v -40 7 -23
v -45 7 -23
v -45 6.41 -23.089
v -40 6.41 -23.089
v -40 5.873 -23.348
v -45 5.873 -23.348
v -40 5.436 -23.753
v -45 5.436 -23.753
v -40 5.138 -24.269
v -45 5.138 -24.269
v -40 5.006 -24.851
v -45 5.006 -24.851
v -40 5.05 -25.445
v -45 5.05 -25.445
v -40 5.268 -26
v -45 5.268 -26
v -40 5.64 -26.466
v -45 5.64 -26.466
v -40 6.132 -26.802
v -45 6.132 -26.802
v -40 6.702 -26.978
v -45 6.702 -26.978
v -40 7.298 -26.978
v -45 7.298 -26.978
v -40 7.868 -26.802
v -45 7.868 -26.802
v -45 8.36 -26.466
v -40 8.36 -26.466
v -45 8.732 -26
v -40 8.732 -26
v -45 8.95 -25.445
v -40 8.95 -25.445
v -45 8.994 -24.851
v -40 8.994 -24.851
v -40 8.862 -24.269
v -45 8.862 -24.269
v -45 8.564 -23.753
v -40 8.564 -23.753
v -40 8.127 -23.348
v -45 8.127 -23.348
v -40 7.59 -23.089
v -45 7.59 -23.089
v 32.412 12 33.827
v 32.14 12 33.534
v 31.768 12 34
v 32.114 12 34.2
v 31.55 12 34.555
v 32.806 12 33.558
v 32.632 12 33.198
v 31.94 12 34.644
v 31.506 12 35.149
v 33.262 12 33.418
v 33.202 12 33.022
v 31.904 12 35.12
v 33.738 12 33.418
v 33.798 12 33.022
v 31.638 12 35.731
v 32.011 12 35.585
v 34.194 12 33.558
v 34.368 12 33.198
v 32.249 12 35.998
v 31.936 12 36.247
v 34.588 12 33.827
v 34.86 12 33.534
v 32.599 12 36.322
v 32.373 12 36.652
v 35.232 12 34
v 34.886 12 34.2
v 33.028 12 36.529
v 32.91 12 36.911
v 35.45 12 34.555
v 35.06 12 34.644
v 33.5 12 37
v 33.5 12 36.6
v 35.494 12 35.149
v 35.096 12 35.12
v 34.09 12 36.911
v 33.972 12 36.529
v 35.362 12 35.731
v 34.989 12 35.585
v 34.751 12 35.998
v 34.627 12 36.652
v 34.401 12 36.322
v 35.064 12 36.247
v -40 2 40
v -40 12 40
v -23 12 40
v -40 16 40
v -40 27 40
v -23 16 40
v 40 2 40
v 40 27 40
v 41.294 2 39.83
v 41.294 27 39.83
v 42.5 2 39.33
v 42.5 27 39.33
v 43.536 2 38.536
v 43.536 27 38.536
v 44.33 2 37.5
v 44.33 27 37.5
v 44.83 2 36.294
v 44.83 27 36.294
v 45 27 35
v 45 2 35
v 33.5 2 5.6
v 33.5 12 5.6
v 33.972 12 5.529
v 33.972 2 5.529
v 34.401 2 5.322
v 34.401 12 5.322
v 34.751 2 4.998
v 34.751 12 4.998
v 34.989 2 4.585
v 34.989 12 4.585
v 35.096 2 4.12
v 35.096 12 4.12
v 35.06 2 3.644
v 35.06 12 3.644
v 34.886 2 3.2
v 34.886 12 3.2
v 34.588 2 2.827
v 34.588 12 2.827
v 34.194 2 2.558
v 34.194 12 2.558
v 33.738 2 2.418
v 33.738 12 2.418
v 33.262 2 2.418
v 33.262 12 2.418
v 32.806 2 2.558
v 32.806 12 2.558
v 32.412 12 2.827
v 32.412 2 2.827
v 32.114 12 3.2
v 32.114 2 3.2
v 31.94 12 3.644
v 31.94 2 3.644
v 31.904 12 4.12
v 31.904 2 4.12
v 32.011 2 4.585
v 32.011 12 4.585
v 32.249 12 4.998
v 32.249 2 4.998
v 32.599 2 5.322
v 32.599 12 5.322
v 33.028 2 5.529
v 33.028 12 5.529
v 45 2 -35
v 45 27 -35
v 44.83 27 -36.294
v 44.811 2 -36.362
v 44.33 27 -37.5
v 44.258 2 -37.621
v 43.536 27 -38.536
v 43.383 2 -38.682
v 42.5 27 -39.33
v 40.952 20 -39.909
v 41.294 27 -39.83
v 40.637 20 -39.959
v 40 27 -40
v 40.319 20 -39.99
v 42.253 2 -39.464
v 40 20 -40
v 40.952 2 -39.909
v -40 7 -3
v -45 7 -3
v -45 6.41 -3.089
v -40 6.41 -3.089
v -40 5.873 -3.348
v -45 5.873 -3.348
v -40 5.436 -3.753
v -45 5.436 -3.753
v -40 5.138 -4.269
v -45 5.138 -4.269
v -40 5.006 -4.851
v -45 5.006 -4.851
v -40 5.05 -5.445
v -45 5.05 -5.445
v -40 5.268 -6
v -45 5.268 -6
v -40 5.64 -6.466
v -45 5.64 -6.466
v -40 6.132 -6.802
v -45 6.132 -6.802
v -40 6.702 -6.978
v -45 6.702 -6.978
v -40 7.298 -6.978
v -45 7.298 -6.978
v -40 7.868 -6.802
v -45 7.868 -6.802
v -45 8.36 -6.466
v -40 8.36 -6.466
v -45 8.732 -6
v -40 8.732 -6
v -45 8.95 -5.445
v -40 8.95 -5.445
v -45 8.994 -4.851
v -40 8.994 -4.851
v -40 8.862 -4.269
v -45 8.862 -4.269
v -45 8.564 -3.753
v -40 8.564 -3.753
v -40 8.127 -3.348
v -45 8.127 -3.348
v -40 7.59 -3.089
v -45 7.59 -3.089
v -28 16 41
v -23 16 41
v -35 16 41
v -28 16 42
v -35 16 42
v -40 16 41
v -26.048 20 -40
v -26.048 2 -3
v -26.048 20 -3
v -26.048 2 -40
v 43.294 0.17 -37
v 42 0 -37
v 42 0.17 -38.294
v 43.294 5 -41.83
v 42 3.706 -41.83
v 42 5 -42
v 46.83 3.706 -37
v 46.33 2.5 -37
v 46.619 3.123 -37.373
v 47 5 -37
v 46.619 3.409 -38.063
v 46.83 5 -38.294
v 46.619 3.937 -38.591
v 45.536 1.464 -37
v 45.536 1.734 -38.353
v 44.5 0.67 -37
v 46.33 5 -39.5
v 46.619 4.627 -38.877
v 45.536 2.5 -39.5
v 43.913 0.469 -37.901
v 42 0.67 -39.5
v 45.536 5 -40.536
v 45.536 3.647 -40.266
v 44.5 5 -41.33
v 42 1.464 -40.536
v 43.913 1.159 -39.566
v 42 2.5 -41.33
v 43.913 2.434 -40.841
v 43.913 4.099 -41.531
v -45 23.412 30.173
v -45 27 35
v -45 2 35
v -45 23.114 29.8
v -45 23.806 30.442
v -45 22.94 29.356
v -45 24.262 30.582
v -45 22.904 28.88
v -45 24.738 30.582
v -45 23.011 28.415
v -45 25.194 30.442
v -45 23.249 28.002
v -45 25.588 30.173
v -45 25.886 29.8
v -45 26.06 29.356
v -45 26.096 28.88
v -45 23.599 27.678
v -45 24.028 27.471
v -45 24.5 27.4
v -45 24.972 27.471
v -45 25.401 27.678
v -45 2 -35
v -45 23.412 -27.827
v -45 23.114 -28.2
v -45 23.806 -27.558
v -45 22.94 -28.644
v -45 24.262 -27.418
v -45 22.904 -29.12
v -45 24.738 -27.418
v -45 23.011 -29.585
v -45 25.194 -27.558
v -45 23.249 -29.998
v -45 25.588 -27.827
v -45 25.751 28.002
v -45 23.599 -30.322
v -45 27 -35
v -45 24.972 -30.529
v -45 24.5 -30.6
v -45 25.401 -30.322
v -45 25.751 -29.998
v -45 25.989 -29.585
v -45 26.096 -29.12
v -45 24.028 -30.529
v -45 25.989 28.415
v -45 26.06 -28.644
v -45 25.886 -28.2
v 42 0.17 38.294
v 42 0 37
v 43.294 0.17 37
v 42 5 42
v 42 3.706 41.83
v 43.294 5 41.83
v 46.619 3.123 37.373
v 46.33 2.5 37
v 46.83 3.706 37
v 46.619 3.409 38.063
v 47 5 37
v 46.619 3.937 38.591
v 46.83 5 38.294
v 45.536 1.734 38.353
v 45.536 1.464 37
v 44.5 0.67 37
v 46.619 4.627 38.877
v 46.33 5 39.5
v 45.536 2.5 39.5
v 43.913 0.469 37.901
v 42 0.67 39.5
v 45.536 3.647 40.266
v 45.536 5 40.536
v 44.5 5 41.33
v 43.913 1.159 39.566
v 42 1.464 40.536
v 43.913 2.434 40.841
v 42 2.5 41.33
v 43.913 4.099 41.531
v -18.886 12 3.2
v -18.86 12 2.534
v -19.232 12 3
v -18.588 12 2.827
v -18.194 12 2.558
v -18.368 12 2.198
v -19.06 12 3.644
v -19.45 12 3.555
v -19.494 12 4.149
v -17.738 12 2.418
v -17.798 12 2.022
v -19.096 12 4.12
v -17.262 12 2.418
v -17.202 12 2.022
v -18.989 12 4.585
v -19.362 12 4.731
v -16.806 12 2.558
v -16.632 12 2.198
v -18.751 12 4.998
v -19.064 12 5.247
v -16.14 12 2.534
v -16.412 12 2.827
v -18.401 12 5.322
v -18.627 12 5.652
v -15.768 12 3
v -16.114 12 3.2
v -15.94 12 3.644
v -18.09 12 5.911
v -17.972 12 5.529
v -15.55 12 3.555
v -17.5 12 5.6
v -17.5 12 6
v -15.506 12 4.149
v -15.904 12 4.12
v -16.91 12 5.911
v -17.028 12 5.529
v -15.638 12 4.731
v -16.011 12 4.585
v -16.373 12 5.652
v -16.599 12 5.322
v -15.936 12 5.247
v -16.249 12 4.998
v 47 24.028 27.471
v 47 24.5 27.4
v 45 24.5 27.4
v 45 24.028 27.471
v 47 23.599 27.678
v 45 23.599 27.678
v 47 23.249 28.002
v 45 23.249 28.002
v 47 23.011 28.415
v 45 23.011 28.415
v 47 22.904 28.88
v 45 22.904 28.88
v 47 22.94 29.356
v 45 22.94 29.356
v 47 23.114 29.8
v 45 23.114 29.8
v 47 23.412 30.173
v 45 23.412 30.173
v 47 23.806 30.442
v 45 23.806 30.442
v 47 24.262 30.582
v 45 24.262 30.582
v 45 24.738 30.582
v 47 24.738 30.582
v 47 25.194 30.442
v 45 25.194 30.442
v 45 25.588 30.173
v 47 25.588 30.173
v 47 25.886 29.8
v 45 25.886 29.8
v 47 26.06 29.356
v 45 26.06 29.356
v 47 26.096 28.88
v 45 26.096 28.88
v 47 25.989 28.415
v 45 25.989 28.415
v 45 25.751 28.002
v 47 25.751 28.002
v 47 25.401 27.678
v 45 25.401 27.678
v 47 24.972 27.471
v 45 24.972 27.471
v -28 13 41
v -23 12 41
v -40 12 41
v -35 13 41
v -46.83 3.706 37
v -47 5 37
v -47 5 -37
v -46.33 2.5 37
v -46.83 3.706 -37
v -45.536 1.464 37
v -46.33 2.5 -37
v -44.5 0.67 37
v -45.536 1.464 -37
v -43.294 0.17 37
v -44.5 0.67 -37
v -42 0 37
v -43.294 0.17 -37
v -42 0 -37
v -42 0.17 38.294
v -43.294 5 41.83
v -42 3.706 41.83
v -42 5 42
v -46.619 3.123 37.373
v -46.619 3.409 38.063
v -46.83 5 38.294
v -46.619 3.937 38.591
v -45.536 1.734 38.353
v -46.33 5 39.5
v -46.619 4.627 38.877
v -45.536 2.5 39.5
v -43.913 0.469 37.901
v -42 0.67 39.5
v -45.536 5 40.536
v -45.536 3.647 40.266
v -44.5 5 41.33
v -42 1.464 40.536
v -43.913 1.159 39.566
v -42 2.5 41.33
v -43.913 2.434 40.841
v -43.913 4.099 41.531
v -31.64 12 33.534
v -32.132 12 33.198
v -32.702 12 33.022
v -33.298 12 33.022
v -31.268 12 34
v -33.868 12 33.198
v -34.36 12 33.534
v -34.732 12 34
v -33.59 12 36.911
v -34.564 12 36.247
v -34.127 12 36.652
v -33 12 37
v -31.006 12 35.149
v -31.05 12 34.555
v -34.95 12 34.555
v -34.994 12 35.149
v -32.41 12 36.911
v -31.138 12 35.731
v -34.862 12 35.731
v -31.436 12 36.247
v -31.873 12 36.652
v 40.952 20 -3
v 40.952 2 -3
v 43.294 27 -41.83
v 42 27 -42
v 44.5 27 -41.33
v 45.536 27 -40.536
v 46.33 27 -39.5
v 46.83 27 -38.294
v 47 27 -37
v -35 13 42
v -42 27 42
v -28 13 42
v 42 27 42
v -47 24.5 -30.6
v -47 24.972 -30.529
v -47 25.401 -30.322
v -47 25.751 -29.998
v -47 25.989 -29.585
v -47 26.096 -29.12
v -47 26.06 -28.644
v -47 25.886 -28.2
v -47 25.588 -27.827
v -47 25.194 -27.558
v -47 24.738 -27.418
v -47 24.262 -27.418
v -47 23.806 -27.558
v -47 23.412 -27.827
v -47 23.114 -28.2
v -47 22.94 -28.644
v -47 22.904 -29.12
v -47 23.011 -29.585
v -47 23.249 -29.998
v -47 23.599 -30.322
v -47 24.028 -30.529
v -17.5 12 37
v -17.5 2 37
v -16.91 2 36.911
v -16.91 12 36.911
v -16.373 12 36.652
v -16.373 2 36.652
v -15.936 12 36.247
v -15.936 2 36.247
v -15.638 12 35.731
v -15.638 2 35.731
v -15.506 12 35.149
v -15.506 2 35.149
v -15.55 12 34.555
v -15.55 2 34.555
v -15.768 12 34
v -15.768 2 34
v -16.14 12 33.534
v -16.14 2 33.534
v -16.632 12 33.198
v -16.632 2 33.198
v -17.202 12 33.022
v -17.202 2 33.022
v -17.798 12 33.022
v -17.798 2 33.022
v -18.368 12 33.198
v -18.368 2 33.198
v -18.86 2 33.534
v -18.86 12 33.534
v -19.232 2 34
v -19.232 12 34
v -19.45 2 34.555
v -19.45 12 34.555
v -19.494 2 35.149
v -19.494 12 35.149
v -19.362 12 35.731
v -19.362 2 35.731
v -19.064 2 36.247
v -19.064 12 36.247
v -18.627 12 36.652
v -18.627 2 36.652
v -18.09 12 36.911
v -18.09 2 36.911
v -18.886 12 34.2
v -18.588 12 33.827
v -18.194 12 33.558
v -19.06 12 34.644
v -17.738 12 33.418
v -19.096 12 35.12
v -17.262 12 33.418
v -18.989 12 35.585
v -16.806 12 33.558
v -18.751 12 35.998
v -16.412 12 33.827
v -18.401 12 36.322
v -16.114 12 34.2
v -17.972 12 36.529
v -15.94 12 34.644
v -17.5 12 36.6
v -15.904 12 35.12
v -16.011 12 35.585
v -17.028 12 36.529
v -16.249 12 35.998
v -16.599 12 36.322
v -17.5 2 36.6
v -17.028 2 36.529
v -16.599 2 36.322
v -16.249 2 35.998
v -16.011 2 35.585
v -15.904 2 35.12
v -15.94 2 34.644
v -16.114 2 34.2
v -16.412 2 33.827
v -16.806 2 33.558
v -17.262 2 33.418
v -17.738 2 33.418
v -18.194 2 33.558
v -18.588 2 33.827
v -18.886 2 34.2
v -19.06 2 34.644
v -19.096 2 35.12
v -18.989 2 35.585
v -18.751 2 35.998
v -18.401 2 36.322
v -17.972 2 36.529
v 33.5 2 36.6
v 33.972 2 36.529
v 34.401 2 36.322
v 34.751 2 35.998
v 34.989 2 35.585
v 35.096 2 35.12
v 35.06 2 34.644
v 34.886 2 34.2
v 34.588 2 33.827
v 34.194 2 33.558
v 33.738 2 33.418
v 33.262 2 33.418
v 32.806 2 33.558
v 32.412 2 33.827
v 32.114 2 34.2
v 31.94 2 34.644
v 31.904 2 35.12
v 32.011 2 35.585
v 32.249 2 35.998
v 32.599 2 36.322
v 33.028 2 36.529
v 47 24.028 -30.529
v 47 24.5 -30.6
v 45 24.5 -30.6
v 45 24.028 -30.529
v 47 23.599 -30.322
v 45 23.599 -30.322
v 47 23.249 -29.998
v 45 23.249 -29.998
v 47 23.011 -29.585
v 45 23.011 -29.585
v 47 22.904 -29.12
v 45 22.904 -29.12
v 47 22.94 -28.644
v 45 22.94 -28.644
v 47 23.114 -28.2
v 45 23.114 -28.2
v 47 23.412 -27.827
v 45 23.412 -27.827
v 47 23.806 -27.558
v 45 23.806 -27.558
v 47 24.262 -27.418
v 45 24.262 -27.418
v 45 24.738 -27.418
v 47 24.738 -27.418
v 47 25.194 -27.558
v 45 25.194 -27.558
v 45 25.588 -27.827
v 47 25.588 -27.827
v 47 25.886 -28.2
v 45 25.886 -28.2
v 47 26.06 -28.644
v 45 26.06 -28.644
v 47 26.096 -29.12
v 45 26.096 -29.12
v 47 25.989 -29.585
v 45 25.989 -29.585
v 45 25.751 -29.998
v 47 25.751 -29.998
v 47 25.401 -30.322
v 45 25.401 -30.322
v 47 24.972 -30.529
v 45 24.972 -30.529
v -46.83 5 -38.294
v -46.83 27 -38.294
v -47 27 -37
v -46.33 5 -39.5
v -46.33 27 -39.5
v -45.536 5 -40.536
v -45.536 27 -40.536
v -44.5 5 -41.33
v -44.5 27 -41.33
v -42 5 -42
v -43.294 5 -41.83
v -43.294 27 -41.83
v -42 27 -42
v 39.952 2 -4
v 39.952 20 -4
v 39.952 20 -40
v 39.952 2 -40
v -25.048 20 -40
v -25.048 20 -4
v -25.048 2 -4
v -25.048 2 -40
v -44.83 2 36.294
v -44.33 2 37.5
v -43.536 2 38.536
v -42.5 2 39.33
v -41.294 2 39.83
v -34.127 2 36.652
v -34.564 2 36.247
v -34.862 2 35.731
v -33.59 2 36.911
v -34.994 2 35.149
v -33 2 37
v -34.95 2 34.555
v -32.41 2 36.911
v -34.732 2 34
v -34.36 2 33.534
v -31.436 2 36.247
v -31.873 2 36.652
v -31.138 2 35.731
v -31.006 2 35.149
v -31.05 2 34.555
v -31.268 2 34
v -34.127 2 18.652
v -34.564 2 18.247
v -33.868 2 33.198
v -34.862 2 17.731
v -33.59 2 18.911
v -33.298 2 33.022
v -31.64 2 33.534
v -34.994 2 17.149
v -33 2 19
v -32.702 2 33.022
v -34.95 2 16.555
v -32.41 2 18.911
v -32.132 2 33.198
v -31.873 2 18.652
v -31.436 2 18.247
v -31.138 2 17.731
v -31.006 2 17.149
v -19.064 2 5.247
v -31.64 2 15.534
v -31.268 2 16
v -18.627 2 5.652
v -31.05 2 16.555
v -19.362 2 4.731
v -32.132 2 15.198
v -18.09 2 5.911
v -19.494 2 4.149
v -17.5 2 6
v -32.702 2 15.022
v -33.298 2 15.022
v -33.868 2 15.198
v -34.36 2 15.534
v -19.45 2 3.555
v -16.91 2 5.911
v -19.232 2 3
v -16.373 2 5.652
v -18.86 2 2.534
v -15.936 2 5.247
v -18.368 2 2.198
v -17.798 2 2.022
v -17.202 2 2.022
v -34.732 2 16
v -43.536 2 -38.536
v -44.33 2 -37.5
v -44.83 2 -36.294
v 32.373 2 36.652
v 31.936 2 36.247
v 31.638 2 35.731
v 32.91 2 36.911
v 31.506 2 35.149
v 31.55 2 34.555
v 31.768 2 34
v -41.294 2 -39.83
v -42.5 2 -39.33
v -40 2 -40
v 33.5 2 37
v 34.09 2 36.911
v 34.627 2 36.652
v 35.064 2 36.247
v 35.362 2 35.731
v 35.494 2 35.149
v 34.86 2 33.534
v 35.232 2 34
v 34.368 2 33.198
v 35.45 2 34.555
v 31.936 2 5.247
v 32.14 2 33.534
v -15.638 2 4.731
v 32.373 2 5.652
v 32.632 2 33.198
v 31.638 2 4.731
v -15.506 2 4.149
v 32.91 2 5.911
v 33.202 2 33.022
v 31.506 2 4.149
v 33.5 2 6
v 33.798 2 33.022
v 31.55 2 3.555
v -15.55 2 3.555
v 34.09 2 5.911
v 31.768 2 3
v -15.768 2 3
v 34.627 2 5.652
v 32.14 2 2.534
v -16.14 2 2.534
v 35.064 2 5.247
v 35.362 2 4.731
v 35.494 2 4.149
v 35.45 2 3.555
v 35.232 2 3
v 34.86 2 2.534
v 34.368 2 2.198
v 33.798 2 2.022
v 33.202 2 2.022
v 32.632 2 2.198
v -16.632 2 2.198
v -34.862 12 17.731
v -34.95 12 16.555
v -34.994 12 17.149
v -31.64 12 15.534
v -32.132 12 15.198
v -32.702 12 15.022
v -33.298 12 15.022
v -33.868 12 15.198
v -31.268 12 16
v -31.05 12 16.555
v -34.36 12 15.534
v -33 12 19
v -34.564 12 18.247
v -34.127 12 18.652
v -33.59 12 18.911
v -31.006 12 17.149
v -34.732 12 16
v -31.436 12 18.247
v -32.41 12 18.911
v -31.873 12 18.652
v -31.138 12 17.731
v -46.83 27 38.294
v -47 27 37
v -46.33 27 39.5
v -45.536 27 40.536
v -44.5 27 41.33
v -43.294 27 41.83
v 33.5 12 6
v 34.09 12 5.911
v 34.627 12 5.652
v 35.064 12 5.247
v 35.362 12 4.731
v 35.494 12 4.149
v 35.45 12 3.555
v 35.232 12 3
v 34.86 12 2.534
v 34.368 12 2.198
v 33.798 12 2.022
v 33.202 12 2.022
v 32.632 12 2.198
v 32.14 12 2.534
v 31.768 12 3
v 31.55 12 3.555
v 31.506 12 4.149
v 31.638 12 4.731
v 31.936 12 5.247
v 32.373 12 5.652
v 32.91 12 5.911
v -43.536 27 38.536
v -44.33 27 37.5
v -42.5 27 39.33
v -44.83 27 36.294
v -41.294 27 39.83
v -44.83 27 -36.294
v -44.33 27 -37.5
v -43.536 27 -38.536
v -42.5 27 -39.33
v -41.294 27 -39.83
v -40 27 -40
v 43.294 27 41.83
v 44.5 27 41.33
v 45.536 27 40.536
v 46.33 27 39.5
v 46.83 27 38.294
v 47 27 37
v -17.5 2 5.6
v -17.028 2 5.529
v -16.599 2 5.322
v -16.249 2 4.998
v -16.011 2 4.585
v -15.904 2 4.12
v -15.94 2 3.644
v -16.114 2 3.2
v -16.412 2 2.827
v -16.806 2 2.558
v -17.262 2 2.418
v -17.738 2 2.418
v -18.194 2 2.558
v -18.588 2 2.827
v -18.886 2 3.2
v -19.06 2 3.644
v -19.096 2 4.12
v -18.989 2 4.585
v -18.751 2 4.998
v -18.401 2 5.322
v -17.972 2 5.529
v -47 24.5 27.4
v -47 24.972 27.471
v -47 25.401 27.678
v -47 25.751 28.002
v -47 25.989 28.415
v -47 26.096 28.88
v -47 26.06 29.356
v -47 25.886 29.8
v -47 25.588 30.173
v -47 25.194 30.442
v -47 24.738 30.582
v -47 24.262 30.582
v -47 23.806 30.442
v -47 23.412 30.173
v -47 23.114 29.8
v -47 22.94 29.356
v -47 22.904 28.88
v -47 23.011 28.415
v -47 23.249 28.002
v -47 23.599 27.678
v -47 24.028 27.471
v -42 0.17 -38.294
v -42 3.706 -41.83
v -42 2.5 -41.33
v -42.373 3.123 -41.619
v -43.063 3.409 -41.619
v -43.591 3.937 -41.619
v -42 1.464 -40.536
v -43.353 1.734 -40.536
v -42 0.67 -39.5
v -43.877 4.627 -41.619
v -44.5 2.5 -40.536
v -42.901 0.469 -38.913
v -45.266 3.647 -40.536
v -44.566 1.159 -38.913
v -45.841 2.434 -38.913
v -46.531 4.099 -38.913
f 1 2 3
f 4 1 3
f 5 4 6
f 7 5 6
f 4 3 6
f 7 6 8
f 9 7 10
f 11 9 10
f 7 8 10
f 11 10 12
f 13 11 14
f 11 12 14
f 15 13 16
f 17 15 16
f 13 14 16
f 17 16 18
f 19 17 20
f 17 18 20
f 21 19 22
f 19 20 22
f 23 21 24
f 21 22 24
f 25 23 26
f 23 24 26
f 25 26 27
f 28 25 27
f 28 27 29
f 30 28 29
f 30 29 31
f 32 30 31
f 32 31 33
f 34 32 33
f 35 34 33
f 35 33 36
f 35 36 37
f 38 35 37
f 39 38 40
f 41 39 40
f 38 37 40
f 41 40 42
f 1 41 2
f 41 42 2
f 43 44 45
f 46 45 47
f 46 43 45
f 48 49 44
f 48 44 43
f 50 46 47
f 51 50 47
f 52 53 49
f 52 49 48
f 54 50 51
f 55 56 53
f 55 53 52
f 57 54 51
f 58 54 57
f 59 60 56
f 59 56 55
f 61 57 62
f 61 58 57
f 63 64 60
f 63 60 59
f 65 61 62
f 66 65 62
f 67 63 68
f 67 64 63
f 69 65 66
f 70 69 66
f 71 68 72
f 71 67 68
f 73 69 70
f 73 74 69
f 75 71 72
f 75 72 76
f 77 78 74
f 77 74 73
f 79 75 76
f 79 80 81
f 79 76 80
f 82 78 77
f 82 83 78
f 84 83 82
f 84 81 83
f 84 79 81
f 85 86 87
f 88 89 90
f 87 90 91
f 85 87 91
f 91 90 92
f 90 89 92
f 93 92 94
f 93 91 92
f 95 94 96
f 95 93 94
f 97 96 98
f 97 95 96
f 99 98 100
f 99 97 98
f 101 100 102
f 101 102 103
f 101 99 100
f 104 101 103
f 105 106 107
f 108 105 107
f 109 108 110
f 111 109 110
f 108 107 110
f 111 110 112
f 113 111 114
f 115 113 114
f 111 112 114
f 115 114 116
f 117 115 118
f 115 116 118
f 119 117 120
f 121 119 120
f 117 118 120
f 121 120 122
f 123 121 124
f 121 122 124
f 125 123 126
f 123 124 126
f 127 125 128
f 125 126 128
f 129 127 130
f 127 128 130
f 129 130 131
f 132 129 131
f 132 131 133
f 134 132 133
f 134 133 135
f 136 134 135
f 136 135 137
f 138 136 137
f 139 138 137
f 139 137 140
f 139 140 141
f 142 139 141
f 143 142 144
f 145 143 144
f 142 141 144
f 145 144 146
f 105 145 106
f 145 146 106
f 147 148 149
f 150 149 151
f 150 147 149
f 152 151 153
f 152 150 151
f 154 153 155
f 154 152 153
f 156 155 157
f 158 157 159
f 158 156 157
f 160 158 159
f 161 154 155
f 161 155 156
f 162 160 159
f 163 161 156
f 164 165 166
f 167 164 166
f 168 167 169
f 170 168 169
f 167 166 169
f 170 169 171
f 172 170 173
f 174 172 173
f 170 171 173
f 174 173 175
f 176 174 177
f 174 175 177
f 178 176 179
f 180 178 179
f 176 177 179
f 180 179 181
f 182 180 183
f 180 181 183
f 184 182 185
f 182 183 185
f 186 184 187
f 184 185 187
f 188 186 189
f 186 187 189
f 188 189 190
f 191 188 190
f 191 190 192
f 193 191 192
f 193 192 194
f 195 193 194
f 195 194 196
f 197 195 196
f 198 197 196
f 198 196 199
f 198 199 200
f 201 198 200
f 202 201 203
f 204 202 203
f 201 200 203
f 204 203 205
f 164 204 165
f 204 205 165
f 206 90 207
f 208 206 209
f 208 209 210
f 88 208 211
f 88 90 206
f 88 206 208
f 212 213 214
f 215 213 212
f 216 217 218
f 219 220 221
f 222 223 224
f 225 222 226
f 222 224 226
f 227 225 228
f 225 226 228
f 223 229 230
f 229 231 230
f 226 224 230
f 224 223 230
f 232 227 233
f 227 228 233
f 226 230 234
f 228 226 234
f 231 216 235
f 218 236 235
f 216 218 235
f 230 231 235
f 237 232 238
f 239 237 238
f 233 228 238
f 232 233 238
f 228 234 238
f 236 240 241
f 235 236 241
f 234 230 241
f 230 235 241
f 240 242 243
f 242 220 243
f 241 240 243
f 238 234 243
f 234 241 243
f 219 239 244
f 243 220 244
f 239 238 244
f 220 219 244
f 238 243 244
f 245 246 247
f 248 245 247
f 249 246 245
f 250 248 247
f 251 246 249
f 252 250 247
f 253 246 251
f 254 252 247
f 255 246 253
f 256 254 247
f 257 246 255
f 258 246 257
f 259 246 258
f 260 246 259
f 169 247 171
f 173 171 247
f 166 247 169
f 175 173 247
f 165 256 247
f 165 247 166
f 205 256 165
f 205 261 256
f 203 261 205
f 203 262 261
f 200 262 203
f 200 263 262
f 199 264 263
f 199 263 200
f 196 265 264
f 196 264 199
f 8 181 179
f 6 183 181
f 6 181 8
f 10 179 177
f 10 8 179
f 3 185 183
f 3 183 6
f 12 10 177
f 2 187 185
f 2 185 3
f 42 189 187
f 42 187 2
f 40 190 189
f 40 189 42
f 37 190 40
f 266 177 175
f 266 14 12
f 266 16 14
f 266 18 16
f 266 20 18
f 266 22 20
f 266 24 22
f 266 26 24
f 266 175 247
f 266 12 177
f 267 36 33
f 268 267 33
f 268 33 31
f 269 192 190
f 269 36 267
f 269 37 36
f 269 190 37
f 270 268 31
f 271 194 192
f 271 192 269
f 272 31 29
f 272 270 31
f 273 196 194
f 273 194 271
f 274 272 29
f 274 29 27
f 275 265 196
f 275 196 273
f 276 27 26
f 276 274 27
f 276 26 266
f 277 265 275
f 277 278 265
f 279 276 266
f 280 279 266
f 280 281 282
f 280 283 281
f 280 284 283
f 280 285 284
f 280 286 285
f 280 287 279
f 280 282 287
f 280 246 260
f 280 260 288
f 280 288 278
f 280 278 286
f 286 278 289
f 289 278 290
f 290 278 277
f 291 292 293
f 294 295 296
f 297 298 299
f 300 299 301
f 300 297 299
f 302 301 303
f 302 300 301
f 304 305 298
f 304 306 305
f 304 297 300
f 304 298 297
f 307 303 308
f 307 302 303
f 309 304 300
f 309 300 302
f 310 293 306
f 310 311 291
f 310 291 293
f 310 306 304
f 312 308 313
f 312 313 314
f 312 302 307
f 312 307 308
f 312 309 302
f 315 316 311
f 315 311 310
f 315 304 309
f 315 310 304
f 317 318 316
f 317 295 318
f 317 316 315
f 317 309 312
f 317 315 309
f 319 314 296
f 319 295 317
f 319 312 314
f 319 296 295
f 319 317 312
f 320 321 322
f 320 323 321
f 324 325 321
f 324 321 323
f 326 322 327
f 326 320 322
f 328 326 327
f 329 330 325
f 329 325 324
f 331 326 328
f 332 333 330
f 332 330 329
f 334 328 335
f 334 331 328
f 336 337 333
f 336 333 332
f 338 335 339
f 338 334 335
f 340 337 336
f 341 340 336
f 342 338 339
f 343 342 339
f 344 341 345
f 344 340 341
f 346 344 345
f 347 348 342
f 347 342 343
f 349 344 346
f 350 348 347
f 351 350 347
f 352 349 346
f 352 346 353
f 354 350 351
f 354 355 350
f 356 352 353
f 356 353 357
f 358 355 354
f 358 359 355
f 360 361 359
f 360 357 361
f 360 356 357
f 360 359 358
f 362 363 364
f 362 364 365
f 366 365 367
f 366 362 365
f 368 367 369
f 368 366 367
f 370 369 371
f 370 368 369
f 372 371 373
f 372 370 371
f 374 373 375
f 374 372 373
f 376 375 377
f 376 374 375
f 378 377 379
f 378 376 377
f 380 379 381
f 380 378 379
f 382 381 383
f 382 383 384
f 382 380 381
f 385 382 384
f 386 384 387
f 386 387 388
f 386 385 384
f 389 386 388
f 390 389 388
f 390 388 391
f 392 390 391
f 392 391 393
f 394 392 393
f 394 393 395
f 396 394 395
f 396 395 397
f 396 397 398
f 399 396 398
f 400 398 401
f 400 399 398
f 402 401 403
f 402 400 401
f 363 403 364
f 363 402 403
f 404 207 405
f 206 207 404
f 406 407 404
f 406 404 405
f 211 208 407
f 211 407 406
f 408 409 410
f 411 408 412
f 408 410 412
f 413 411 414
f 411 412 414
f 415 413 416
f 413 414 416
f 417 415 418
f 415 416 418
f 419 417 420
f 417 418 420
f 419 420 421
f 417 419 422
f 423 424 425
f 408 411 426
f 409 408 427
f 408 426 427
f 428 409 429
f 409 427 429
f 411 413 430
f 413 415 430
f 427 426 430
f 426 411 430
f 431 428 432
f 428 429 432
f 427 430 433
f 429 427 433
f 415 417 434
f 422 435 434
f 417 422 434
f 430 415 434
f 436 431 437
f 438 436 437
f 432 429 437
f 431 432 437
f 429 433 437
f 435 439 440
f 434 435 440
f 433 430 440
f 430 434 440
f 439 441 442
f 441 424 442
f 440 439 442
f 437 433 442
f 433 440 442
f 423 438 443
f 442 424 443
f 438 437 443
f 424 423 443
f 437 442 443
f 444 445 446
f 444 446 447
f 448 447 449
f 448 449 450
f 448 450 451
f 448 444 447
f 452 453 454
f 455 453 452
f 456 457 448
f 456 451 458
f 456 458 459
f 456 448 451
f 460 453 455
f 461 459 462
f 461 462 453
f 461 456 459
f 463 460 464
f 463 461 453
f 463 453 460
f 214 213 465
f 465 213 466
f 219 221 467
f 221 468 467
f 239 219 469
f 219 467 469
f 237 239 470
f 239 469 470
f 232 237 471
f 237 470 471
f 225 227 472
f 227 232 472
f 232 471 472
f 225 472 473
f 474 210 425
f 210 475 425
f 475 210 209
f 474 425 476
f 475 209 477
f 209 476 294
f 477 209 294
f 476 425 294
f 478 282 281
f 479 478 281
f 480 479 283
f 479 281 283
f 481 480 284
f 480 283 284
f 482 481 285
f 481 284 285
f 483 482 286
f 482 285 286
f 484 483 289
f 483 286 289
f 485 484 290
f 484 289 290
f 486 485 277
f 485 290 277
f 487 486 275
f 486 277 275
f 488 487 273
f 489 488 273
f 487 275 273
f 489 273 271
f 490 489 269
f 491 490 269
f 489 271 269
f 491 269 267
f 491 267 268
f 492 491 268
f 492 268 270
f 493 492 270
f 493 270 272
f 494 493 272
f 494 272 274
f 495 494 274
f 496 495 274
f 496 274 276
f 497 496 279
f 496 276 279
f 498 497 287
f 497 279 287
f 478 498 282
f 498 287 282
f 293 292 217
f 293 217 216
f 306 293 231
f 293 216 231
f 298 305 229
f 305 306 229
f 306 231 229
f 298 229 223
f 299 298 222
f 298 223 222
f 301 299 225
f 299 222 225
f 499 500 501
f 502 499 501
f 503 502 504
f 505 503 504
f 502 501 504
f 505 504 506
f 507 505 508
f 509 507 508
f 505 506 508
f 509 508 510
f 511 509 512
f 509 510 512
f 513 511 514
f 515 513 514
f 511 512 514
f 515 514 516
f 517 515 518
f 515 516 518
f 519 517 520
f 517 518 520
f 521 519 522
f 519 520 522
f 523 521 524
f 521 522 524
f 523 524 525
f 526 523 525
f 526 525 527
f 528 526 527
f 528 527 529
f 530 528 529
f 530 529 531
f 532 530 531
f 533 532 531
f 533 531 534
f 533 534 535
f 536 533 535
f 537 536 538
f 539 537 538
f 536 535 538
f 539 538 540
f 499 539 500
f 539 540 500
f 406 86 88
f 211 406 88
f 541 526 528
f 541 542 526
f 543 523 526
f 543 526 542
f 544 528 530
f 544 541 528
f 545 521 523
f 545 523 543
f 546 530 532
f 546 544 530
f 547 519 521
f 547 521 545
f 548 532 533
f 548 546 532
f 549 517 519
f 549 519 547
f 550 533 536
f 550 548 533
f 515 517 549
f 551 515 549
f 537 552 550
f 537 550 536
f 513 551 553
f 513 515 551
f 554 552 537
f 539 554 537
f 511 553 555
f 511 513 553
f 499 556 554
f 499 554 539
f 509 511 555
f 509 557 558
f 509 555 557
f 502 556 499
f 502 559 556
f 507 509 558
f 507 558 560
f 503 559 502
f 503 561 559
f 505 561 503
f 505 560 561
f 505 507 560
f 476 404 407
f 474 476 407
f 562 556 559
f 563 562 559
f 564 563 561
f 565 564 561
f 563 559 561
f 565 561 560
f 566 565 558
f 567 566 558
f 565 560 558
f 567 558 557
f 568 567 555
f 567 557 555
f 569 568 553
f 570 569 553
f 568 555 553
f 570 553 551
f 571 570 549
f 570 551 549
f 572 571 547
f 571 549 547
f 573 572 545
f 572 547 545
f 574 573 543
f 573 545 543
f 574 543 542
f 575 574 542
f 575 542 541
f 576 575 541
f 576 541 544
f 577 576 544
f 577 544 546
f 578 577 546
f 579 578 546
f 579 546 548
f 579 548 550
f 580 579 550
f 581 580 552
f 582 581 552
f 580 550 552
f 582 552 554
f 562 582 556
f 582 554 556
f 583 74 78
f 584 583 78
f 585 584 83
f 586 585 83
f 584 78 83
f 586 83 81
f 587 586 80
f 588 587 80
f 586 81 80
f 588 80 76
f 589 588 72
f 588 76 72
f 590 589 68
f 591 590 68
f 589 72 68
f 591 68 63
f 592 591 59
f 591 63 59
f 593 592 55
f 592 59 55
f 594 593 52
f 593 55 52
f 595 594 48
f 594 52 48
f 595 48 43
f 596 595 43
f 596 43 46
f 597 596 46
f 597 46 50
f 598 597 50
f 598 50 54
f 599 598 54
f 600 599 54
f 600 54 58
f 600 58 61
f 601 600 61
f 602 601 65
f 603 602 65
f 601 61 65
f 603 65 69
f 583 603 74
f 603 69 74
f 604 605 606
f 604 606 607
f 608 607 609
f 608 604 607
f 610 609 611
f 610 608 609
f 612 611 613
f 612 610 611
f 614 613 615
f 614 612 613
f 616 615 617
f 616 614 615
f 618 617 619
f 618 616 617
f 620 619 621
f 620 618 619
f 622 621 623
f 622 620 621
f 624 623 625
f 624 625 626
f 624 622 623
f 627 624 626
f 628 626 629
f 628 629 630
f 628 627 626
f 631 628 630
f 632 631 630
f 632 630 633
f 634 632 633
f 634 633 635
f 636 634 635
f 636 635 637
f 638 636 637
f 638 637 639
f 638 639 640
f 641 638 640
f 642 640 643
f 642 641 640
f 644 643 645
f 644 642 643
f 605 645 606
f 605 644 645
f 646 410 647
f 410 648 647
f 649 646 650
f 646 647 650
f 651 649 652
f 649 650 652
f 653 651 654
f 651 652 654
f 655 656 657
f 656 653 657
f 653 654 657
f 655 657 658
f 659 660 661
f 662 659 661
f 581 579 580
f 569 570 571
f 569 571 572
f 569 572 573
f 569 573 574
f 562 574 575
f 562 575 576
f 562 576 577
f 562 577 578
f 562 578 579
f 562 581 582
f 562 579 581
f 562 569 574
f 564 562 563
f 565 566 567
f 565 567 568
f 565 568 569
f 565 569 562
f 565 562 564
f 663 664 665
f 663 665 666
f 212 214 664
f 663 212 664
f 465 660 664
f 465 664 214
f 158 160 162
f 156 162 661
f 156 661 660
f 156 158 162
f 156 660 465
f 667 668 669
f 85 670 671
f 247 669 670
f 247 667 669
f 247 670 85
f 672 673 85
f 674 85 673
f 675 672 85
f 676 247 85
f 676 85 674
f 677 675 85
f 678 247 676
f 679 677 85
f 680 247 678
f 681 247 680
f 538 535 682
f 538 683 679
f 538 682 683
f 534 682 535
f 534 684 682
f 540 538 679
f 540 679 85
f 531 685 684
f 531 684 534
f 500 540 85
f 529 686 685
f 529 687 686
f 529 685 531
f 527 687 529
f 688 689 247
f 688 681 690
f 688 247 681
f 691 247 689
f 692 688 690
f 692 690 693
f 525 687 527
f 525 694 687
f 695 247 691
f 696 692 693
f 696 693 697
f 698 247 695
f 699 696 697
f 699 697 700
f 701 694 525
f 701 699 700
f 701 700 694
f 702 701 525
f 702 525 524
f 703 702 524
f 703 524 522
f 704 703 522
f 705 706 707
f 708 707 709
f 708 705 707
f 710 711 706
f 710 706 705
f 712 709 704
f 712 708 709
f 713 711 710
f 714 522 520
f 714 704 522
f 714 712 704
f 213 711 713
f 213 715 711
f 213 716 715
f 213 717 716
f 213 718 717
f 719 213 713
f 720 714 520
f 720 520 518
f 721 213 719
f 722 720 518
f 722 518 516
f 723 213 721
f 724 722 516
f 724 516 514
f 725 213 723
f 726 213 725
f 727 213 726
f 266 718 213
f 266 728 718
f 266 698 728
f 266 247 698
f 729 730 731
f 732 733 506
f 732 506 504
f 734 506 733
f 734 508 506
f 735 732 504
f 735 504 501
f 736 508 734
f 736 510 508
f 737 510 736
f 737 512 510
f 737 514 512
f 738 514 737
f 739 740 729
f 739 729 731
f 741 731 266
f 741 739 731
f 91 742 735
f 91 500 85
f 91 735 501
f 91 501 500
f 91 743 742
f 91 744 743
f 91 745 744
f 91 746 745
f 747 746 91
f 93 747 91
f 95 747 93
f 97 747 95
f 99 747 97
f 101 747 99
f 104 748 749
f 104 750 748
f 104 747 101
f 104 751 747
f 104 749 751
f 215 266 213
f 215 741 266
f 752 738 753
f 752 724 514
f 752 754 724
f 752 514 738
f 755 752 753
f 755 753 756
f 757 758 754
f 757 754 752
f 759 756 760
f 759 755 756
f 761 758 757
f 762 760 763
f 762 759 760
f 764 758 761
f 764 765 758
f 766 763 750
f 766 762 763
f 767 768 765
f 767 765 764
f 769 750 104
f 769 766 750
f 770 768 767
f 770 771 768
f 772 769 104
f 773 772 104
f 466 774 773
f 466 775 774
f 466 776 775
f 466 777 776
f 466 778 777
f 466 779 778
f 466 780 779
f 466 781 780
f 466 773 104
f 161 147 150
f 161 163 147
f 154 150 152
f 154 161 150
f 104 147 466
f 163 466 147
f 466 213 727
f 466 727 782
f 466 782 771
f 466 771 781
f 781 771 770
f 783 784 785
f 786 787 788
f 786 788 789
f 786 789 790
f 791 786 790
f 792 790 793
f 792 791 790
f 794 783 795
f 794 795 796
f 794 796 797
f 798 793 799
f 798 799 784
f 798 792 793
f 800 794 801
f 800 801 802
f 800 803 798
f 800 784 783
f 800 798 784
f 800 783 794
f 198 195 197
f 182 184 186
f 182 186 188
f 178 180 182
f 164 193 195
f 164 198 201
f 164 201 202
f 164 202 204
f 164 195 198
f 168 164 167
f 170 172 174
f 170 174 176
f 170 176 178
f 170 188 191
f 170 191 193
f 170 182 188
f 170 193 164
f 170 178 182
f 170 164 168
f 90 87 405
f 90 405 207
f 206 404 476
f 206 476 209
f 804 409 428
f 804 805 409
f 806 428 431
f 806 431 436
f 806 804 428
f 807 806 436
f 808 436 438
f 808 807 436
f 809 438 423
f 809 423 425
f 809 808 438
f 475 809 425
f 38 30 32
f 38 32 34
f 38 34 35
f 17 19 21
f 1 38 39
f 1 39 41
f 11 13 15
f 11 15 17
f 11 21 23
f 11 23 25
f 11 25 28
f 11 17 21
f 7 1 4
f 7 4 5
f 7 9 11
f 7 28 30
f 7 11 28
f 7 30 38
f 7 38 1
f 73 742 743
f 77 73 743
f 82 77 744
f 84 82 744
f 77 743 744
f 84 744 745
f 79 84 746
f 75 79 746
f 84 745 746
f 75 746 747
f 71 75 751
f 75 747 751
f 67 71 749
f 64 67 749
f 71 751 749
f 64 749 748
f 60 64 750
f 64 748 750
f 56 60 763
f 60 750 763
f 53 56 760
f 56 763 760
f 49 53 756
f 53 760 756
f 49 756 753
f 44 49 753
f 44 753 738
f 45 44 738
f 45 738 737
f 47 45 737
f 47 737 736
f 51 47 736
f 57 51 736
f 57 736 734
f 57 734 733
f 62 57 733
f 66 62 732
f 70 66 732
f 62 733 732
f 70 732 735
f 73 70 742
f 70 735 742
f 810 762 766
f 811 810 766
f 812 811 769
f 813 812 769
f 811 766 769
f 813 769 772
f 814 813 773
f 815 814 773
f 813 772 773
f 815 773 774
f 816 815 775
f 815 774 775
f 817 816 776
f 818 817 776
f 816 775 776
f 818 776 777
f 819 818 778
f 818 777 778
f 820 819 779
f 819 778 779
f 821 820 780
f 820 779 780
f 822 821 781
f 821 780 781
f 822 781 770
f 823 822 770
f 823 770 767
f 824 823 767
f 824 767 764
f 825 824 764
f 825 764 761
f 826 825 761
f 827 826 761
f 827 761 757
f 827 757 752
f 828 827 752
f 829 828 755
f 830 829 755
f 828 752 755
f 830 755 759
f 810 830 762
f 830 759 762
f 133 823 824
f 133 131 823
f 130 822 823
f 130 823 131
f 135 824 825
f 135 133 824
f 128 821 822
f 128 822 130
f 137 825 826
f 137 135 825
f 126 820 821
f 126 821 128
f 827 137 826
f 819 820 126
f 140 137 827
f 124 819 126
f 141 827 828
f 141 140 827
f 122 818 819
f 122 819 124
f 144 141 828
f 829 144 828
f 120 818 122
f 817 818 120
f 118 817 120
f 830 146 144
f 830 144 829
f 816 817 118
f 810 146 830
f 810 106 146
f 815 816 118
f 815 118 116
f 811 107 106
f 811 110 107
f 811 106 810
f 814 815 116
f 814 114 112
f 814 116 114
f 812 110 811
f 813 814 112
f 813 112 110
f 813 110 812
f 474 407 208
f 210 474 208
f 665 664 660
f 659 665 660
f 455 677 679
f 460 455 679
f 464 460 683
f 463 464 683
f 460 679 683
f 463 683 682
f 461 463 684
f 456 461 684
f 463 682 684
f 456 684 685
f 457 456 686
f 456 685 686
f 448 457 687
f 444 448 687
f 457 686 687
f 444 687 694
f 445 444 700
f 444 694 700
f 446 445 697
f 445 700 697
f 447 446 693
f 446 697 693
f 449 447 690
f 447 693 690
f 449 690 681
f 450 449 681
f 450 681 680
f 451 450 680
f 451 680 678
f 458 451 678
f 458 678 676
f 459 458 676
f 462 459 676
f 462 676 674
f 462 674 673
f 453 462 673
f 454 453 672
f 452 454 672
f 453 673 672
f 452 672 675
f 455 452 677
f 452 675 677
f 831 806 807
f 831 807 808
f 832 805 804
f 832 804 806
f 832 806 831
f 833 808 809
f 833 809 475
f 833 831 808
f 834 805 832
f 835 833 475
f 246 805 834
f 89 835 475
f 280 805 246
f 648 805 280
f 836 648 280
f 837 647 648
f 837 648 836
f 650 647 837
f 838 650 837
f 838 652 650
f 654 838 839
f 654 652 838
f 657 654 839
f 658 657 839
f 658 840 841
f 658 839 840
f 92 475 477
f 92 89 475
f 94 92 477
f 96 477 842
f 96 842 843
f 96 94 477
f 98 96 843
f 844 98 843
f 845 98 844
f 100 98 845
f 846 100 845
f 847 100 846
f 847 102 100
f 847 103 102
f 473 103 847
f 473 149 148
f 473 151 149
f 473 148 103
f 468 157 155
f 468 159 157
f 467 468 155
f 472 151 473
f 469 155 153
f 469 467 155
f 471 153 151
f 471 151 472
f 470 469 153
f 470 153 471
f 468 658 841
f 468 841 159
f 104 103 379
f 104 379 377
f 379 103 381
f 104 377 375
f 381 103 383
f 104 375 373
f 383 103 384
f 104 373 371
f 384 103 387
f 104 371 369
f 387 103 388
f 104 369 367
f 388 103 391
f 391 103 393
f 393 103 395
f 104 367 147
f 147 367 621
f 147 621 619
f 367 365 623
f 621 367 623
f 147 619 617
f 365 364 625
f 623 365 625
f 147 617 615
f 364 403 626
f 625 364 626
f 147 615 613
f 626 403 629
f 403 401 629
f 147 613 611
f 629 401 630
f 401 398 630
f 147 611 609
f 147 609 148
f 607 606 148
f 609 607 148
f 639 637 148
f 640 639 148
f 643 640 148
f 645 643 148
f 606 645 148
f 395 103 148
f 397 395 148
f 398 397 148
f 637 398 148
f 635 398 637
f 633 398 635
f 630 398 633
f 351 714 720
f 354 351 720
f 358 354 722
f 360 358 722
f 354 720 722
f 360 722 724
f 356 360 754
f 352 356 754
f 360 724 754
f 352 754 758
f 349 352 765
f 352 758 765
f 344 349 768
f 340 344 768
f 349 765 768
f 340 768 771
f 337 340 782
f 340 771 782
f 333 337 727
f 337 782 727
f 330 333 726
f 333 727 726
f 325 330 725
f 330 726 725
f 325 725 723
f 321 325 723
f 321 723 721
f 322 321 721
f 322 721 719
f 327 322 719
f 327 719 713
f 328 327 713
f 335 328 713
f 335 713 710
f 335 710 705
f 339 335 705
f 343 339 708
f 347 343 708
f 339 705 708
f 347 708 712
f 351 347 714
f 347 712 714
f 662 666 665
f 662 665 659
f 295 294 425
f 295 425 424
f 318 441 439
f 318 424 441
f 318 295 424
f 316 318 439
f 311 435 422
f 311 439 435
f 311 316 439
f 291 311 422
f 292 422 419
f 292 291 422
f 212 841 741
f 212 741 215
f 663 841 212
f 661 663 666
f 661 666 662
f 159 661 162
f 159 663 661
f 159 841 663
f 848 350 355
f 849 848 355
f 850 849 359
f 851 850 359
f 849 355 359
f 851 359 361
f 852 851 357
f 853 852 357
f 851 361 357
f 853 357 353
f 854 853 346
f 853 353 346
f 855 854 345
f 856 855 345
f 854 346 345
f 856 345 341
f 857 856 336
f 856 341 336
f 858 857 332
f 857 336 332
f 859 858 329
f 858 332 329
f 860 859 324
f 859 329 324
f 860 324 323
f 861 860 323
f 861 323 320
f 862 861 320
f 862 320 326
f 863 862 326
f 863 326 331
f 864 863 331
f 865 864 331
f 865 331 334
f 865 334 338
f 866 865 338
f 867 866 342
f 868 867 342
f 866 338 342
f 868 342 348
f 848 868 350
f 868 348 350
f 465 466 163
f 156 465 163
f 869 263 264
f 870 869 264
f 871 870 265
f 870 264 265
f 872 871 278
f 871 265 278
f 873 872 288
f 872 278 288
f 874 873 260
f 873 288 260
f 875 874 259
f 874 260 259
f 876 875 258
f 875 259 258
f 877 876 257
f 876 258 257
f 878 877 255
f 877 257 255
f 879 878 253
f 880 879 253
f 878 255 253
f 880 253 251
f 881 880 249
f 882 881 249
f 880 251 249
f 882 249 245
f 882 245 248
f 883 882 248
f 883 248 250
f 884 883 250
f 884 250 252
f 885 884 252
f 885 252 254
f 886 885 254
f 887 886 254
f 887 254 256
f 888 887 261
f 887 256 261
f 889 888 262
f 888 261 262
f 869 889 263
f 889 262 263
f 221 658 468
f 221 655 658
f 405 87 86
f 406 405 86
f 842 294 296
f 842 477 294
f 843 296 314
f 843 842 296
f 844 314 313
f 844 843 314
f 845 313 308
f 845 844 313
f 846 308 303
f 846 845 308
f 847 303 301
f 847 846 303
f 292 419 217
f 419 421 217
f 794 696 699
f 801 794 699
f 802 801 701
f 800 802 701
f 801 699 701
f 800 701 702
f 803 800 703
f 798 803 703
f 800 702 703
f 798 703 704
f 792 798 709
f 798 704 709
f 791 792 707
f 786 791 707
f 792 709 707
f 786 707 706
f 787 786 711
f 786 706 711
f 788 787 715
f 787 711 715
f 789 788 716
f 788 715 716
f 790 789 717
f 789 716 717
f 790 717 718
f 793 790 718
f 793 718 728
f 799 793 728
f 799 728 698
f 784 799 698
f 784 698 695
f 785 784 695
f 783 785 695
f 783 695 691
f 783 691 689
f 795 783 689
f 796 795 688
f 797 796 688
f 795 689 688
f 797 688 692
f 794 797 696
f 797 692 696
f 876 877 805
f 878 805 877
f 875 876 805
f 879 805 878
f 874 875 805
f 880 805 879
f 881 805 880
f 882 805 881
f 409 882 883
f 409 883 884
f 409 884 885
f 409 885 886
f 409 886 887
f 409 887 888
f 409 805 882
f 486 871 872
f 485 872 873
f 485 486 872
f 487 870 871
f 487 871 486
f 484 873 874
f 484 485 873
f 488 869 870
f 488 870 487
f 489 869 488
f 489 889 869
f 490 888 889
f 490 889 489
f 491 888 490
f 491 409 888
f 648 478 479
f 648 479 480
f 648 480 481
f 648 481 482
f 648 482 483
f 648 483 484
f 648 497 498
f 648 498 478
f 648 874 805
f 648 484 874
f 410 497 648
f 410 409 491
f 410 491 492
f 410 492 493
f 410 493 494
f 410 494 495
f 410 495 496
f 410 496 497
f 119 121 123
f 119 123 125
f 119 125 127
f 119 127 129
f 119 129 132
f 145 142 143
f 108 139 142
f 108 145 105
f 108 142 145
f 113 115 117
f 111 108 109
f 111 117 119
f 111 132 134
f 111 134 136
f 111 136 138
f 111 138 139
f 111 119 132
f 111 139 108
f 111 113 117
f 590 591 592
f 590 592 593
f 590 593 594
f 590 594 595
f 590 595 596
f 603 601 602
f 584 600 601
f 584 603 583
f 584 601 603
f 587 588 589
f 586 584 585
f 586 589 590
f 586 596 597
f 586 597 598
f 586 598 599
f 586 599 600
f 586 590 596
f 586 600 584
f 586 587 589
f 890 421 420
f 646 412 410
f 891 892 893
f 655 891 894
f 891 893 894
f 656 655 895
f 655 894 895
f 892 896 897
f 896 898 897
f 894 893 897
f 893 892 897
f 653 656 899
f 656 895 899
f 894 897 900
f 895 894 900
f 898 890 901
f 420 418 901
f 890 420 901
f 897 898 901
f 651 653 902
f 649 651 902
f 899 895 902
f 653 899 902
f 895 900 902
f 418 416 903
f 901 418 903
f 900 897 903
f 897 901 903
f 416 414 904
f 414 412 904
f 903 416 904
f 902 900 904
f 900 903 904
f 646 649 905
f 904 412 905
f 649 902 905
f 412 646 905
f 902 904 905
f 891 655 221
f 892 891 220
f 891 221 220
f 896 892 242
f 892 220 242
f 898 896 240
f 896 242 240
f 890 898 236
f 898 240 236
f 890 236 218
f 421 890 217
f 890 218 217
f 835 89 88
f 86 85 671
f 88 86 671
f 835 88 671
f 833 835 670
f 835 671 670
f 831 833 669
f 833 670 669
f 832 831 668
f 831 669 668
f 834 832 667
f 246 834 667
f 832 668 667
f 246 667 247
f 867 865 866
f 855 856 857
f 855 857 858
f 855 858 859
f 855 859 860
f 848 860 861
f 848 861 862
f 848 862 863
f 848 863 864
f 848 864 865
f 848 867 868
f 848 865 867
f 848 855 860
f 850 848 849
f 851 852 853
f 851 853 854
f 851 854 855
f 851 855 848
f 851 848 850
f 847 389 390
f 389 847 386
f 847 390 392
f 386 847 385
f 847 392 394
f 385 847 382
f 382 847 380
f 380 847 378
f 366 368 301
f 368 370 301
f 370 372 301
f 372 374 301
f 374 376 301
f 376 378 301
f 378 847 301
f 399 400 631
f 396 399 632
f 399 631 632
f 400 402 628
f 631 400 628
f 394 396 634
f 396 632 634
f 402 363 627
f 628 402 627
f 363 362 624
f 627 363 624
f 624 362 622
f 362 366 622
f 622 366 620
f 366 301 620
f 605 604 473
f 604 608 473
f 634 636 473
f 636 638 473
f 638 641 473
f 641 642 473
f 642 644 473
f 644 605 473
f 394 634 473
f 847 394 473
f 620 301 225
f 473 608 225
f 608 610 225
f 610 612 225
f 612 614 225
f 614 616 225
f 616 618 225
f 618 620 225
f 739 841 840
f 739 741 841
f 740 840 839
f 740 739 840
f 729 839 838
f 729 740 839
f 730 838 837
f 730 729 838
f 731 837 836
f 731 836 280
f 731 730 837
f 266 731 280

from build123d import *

# Parameters (mm, degrees)
SKETCH1_W           = 94
SKETCH1_H           = 84
BOSS_EXTRUDE1_DEPTH = 27
SKETCH2_W           = 90
SKETCH2_H           = 80
CUT_EXTRUDE1_DEPTH  = 25
FILLET2_R           = 5
FILLET3_R           = 5
SKETCH3_R           = 2
BOSS_EXTRUDE2_DEPTH = 10
SKETCH4_R           = 1.6
BOSS_EXTRUDE3_DEPTH = 10
SKETCH5_R           = 1.6
CUT_EXTRUDE2_DEPTH  = 10
SKETCH6_R           = 2
BOSS_EXTRUDE4_DEPTH = 10
SKETCH12_W          = 67
SKETCH12_H          = 37
BOSS_EXTRUDE5_DEPTH = 18
SKETCH13_W          = 65
SKETCH13_H          = 36
CUT_EXTRUDE4_DEPTH  = 18
SKETCH14_W          = 17
SKETCH14_H          = 4
CUT_EXTRUDE5_DEPTH  = 1
SKETCH16_W          = 7
SKETCH16_H          = 3
CUT_EXTRUDE6_DEPTH  = 1
SKETCH17_R          = 2
BOSS_EXTRUDE6_DEPTH = 5
SKETCH18_R          = 1.6
CUT_EXTRUDE7_DEPTH  = 2
CUT_EXTRUDE8_START  = -2
SKETCH19_R          = 1.6
CUT_EXTRUDE8_DEPTH  = 2


with BuildPart() as part:
    # Sketch1 → Boss-Extrude1 (new body)
    with BuildSketch(Plane(origin=(0, 0, 0), x_dir=(1, 0, 0), z_dir=(0, 1, 0))):
        Rectangle(SKETCH1_W, SKETCH1_H)
    extrude(amount=BOSS_EXTRUDE1_DEPTH)

    # Sketch2 → Cut-Extrude1 (cut)
    with BuildSketch(Plane(origin=(0, 27, 0), x_dir=(1, 0, 0), z_dir=(0, 1, 0))):
        Rectangle(SKETCH2_W, SKETCH2_H)
    extrude(amount=-CUT_EXTRUDE1_DEPTH, mode=Mode.SUBTRACT)

    # Fillet2
    fillet2_edges = [part.edges().sort_by_distance(p)[0] for p in [
        (0, 0, 42),
        (-47, 0, 0),
        (0, 0, -42),
        (47, 0, 0),
        (47, 13.5, 42),
        (-47, 13.5, 42),
        (-47, 13.5, -42),
        (47, 13.5, -42),
    ]]
    fillet(fillet2_edges, radius=FILLET2_R)

    # Fillet3
    fillet3_edges = [part.edges().sort_by_distance(p)[0] for p in [
        (45, 14.5, -40),
        (45, 14.5, 40),
        (-45, 14.5, 40),
        (-45, 14.5, -40),
    ]]
    fillet(fillet3_edges, radius=FILLET3_R)

    # Sketch3 → Boss-Extrude2 (add)
    with BuildSketch(Plane(origin=(0, 2, 0), x_dir=(1, 0, 0), z_dir=(0, 1, 0))):
        with Locations(Location((33.5, -35, 0), (0, 0, 270))):
            Circle(SKETCH3_R)
        with Locations(Location((33.5, -4, 0), (0, 0, 270))):
            Circle(SKETCH3_R)
        with Locations(Location((-17.5, -4, 0), (0, 0, 270))):
            Circle(SKETCH3_R)
        with Locations(Location((-17.5, -35, 0), (0, 0, 270))):
            Circle(SKETCH3_R)
    extrude(amount=BOSS_EXTRUDE2_DEPTH)

    # Sketch4 → Boss-Extrude3 (add)
    with BuildSketch(Plane(origin=(0, 12, 0), x_dir=(1, 0, 0), z_dir=(0, 1, 0))):
        with Locations((-17.5, -4)):
            Circle(SKETCH4_R)
        with Locations((33.5, -4)):
            Circle(SKETCH4_R)
        with Locations((-17.5, -35)):
            Circle(SKETCH4_R)
        with Locations((33.5, -35)):
            Circle(SKETCH4_R)
    extrude(amount=-BOSS_EXTRUDE3_DEPTH)

    # Sketch5 → Cut-Extrude2 (cut)
    with BuildSketch(Plane(origin=(0, 12, 0), x_dir=(1, 0, 0), z_dir=(0, 1, 0))):
        with Locations(Location((-17.5, -4, 0), (0, 0, 270))):
            Circle(SKETCH5_R)
        with Locations(Location((33.5, -4, 0), (0, 0, 270))):
            Circle(SKETCH5_R)
        with Locations(Location((-17.5, -35, 0), (0, 0, 270))):
            Circle(SKETCH5_R)
        with Locations(Location((33.5, -35, 0), (0, 0, 270))):
            Circle(SKETCH5_R)
    extrude(amount=-CUT_EXTRUDE2_DEPTH, mode=Mode.SUBTRACT)

    # Sketch6 → Boss-Extrude4 (add)
    with BuildSketch(Plane(origin=(0, 2, 0), x_dir=(1, 0, 0), z_dir=(0, 1, 0))):
        with Locations(Location((-33, -35, 0), (0, 0, 270))):
            Circle(SKETCH6_R)
        with Locations(Location((-33, -17, 0), (0, 0, 270))):
            Circle(SKETCH6_R)
    extrude(amount=BOSS_EXTRUDE4_DEPTH)

    # Sketch12 → Boss-Extrude5 (add)
    with BuildSketch(Plane(origin=(0, 2, 0), x_dir=(1, 0, 0), z_dir=(0, 1, 0))):
        with Locations((7.45155259, 21.5)):
            Rectangle(SKETCH12_W, SKETCH12_H)
    extrude(amount=BOSS_EXTRUDE5_DEPTH)

    # Sketch13 → Cut-Extrude4 (cut)
    with BuildSketch(Plane(origin=(0, 20, 0), x_dir=(1, 0, 0), z_dir=(0, 1, 0))):
        with Locations((7.45155259, 22)):
            Rectangle(SKETCH13_W, SKETCH13_H)
    extrude(amount=-CUT_EXTRUDE4_DEPTH, mode=Mode.SUBTRACT)

    # Sketch14 → Cut-Extrude5 (cut)
    with BuildSketch(Plane(origin=(0, 0, 40), x_dir=(-1, 0, 0), z_dir=(0, 0, -1))):
        with Locations((31.5, 14)):
            Rectangle(SKETCH14_W, SKETCH14_H)
    extrude(amount=-CUT_EXTRUDE5_DEPTH, mode=Mode.SUBTRACT)

    # Sketch16 → Cut-Extrude6 (cut)
    with BuildSketch(Plane(origin=(0, 0, 41), x_dir=(-1, 0, 0), z_dir=(0, 0, -1))):
        with Locations((31.5, 14.5)):
            Rectangle(SKETCH16_W, SKETCH16_H)
    extrude(amount=-CUT_EXTRUDE6_DEPTH, mode=Mode.SUBTRACT)

    # Sketch17 → Boss-Extrude6 (add)
    with BuildSketch(Plane(origin=(-45, 0, 0), x_dir=(0, 0, -1), z_dir=(1, 0, 0))):
        with Locations(Location((25, 7, 0), (0, 0, 180))):
            Circle(SKETCH17_R)
        with Locations(Location((5, 7, 0), (0, 0, 180))):
            Circle(SKETCH17_R)
    extrude(amount=BOSS_EXTRUDE6_DEPTH)

    # Sketch18 → Cut-Extrude7 (cut)
    with BuildSketch(Plane(origin=(-45, 0, 0), x_dir=(0, 0, -1), z_dir=(1, 0, 0))):
        with Locations((29, 24.5)):
            Circle(SKETCH18_R)
        with Locations((-29, 24.5)):
            Circle(SKETCH18_R)
    extrude(amount=-CUT_EXTRUDE7_DEPTH, mode=Mode.SUBTRACT)

    # Sketch19 → Cut-Extrude8 (cut)
    with BuildSketch(Plane.ZY.offset(-45).offset(CUT_EXTRUDE8_START)):
        with Locations(Location((-29, 24.5, 0), (0, 0, 180))):
            Circle(SKETCH19_R)
        with Locations(Location((29, 24.5, 0), (0, 0, 180))):
            Circle(SKETCH19_R)
    extrude(amount=CUT_EXTRUDE8_DEPTH, mode=Mode.SUBTRACT)


solid = part.part
